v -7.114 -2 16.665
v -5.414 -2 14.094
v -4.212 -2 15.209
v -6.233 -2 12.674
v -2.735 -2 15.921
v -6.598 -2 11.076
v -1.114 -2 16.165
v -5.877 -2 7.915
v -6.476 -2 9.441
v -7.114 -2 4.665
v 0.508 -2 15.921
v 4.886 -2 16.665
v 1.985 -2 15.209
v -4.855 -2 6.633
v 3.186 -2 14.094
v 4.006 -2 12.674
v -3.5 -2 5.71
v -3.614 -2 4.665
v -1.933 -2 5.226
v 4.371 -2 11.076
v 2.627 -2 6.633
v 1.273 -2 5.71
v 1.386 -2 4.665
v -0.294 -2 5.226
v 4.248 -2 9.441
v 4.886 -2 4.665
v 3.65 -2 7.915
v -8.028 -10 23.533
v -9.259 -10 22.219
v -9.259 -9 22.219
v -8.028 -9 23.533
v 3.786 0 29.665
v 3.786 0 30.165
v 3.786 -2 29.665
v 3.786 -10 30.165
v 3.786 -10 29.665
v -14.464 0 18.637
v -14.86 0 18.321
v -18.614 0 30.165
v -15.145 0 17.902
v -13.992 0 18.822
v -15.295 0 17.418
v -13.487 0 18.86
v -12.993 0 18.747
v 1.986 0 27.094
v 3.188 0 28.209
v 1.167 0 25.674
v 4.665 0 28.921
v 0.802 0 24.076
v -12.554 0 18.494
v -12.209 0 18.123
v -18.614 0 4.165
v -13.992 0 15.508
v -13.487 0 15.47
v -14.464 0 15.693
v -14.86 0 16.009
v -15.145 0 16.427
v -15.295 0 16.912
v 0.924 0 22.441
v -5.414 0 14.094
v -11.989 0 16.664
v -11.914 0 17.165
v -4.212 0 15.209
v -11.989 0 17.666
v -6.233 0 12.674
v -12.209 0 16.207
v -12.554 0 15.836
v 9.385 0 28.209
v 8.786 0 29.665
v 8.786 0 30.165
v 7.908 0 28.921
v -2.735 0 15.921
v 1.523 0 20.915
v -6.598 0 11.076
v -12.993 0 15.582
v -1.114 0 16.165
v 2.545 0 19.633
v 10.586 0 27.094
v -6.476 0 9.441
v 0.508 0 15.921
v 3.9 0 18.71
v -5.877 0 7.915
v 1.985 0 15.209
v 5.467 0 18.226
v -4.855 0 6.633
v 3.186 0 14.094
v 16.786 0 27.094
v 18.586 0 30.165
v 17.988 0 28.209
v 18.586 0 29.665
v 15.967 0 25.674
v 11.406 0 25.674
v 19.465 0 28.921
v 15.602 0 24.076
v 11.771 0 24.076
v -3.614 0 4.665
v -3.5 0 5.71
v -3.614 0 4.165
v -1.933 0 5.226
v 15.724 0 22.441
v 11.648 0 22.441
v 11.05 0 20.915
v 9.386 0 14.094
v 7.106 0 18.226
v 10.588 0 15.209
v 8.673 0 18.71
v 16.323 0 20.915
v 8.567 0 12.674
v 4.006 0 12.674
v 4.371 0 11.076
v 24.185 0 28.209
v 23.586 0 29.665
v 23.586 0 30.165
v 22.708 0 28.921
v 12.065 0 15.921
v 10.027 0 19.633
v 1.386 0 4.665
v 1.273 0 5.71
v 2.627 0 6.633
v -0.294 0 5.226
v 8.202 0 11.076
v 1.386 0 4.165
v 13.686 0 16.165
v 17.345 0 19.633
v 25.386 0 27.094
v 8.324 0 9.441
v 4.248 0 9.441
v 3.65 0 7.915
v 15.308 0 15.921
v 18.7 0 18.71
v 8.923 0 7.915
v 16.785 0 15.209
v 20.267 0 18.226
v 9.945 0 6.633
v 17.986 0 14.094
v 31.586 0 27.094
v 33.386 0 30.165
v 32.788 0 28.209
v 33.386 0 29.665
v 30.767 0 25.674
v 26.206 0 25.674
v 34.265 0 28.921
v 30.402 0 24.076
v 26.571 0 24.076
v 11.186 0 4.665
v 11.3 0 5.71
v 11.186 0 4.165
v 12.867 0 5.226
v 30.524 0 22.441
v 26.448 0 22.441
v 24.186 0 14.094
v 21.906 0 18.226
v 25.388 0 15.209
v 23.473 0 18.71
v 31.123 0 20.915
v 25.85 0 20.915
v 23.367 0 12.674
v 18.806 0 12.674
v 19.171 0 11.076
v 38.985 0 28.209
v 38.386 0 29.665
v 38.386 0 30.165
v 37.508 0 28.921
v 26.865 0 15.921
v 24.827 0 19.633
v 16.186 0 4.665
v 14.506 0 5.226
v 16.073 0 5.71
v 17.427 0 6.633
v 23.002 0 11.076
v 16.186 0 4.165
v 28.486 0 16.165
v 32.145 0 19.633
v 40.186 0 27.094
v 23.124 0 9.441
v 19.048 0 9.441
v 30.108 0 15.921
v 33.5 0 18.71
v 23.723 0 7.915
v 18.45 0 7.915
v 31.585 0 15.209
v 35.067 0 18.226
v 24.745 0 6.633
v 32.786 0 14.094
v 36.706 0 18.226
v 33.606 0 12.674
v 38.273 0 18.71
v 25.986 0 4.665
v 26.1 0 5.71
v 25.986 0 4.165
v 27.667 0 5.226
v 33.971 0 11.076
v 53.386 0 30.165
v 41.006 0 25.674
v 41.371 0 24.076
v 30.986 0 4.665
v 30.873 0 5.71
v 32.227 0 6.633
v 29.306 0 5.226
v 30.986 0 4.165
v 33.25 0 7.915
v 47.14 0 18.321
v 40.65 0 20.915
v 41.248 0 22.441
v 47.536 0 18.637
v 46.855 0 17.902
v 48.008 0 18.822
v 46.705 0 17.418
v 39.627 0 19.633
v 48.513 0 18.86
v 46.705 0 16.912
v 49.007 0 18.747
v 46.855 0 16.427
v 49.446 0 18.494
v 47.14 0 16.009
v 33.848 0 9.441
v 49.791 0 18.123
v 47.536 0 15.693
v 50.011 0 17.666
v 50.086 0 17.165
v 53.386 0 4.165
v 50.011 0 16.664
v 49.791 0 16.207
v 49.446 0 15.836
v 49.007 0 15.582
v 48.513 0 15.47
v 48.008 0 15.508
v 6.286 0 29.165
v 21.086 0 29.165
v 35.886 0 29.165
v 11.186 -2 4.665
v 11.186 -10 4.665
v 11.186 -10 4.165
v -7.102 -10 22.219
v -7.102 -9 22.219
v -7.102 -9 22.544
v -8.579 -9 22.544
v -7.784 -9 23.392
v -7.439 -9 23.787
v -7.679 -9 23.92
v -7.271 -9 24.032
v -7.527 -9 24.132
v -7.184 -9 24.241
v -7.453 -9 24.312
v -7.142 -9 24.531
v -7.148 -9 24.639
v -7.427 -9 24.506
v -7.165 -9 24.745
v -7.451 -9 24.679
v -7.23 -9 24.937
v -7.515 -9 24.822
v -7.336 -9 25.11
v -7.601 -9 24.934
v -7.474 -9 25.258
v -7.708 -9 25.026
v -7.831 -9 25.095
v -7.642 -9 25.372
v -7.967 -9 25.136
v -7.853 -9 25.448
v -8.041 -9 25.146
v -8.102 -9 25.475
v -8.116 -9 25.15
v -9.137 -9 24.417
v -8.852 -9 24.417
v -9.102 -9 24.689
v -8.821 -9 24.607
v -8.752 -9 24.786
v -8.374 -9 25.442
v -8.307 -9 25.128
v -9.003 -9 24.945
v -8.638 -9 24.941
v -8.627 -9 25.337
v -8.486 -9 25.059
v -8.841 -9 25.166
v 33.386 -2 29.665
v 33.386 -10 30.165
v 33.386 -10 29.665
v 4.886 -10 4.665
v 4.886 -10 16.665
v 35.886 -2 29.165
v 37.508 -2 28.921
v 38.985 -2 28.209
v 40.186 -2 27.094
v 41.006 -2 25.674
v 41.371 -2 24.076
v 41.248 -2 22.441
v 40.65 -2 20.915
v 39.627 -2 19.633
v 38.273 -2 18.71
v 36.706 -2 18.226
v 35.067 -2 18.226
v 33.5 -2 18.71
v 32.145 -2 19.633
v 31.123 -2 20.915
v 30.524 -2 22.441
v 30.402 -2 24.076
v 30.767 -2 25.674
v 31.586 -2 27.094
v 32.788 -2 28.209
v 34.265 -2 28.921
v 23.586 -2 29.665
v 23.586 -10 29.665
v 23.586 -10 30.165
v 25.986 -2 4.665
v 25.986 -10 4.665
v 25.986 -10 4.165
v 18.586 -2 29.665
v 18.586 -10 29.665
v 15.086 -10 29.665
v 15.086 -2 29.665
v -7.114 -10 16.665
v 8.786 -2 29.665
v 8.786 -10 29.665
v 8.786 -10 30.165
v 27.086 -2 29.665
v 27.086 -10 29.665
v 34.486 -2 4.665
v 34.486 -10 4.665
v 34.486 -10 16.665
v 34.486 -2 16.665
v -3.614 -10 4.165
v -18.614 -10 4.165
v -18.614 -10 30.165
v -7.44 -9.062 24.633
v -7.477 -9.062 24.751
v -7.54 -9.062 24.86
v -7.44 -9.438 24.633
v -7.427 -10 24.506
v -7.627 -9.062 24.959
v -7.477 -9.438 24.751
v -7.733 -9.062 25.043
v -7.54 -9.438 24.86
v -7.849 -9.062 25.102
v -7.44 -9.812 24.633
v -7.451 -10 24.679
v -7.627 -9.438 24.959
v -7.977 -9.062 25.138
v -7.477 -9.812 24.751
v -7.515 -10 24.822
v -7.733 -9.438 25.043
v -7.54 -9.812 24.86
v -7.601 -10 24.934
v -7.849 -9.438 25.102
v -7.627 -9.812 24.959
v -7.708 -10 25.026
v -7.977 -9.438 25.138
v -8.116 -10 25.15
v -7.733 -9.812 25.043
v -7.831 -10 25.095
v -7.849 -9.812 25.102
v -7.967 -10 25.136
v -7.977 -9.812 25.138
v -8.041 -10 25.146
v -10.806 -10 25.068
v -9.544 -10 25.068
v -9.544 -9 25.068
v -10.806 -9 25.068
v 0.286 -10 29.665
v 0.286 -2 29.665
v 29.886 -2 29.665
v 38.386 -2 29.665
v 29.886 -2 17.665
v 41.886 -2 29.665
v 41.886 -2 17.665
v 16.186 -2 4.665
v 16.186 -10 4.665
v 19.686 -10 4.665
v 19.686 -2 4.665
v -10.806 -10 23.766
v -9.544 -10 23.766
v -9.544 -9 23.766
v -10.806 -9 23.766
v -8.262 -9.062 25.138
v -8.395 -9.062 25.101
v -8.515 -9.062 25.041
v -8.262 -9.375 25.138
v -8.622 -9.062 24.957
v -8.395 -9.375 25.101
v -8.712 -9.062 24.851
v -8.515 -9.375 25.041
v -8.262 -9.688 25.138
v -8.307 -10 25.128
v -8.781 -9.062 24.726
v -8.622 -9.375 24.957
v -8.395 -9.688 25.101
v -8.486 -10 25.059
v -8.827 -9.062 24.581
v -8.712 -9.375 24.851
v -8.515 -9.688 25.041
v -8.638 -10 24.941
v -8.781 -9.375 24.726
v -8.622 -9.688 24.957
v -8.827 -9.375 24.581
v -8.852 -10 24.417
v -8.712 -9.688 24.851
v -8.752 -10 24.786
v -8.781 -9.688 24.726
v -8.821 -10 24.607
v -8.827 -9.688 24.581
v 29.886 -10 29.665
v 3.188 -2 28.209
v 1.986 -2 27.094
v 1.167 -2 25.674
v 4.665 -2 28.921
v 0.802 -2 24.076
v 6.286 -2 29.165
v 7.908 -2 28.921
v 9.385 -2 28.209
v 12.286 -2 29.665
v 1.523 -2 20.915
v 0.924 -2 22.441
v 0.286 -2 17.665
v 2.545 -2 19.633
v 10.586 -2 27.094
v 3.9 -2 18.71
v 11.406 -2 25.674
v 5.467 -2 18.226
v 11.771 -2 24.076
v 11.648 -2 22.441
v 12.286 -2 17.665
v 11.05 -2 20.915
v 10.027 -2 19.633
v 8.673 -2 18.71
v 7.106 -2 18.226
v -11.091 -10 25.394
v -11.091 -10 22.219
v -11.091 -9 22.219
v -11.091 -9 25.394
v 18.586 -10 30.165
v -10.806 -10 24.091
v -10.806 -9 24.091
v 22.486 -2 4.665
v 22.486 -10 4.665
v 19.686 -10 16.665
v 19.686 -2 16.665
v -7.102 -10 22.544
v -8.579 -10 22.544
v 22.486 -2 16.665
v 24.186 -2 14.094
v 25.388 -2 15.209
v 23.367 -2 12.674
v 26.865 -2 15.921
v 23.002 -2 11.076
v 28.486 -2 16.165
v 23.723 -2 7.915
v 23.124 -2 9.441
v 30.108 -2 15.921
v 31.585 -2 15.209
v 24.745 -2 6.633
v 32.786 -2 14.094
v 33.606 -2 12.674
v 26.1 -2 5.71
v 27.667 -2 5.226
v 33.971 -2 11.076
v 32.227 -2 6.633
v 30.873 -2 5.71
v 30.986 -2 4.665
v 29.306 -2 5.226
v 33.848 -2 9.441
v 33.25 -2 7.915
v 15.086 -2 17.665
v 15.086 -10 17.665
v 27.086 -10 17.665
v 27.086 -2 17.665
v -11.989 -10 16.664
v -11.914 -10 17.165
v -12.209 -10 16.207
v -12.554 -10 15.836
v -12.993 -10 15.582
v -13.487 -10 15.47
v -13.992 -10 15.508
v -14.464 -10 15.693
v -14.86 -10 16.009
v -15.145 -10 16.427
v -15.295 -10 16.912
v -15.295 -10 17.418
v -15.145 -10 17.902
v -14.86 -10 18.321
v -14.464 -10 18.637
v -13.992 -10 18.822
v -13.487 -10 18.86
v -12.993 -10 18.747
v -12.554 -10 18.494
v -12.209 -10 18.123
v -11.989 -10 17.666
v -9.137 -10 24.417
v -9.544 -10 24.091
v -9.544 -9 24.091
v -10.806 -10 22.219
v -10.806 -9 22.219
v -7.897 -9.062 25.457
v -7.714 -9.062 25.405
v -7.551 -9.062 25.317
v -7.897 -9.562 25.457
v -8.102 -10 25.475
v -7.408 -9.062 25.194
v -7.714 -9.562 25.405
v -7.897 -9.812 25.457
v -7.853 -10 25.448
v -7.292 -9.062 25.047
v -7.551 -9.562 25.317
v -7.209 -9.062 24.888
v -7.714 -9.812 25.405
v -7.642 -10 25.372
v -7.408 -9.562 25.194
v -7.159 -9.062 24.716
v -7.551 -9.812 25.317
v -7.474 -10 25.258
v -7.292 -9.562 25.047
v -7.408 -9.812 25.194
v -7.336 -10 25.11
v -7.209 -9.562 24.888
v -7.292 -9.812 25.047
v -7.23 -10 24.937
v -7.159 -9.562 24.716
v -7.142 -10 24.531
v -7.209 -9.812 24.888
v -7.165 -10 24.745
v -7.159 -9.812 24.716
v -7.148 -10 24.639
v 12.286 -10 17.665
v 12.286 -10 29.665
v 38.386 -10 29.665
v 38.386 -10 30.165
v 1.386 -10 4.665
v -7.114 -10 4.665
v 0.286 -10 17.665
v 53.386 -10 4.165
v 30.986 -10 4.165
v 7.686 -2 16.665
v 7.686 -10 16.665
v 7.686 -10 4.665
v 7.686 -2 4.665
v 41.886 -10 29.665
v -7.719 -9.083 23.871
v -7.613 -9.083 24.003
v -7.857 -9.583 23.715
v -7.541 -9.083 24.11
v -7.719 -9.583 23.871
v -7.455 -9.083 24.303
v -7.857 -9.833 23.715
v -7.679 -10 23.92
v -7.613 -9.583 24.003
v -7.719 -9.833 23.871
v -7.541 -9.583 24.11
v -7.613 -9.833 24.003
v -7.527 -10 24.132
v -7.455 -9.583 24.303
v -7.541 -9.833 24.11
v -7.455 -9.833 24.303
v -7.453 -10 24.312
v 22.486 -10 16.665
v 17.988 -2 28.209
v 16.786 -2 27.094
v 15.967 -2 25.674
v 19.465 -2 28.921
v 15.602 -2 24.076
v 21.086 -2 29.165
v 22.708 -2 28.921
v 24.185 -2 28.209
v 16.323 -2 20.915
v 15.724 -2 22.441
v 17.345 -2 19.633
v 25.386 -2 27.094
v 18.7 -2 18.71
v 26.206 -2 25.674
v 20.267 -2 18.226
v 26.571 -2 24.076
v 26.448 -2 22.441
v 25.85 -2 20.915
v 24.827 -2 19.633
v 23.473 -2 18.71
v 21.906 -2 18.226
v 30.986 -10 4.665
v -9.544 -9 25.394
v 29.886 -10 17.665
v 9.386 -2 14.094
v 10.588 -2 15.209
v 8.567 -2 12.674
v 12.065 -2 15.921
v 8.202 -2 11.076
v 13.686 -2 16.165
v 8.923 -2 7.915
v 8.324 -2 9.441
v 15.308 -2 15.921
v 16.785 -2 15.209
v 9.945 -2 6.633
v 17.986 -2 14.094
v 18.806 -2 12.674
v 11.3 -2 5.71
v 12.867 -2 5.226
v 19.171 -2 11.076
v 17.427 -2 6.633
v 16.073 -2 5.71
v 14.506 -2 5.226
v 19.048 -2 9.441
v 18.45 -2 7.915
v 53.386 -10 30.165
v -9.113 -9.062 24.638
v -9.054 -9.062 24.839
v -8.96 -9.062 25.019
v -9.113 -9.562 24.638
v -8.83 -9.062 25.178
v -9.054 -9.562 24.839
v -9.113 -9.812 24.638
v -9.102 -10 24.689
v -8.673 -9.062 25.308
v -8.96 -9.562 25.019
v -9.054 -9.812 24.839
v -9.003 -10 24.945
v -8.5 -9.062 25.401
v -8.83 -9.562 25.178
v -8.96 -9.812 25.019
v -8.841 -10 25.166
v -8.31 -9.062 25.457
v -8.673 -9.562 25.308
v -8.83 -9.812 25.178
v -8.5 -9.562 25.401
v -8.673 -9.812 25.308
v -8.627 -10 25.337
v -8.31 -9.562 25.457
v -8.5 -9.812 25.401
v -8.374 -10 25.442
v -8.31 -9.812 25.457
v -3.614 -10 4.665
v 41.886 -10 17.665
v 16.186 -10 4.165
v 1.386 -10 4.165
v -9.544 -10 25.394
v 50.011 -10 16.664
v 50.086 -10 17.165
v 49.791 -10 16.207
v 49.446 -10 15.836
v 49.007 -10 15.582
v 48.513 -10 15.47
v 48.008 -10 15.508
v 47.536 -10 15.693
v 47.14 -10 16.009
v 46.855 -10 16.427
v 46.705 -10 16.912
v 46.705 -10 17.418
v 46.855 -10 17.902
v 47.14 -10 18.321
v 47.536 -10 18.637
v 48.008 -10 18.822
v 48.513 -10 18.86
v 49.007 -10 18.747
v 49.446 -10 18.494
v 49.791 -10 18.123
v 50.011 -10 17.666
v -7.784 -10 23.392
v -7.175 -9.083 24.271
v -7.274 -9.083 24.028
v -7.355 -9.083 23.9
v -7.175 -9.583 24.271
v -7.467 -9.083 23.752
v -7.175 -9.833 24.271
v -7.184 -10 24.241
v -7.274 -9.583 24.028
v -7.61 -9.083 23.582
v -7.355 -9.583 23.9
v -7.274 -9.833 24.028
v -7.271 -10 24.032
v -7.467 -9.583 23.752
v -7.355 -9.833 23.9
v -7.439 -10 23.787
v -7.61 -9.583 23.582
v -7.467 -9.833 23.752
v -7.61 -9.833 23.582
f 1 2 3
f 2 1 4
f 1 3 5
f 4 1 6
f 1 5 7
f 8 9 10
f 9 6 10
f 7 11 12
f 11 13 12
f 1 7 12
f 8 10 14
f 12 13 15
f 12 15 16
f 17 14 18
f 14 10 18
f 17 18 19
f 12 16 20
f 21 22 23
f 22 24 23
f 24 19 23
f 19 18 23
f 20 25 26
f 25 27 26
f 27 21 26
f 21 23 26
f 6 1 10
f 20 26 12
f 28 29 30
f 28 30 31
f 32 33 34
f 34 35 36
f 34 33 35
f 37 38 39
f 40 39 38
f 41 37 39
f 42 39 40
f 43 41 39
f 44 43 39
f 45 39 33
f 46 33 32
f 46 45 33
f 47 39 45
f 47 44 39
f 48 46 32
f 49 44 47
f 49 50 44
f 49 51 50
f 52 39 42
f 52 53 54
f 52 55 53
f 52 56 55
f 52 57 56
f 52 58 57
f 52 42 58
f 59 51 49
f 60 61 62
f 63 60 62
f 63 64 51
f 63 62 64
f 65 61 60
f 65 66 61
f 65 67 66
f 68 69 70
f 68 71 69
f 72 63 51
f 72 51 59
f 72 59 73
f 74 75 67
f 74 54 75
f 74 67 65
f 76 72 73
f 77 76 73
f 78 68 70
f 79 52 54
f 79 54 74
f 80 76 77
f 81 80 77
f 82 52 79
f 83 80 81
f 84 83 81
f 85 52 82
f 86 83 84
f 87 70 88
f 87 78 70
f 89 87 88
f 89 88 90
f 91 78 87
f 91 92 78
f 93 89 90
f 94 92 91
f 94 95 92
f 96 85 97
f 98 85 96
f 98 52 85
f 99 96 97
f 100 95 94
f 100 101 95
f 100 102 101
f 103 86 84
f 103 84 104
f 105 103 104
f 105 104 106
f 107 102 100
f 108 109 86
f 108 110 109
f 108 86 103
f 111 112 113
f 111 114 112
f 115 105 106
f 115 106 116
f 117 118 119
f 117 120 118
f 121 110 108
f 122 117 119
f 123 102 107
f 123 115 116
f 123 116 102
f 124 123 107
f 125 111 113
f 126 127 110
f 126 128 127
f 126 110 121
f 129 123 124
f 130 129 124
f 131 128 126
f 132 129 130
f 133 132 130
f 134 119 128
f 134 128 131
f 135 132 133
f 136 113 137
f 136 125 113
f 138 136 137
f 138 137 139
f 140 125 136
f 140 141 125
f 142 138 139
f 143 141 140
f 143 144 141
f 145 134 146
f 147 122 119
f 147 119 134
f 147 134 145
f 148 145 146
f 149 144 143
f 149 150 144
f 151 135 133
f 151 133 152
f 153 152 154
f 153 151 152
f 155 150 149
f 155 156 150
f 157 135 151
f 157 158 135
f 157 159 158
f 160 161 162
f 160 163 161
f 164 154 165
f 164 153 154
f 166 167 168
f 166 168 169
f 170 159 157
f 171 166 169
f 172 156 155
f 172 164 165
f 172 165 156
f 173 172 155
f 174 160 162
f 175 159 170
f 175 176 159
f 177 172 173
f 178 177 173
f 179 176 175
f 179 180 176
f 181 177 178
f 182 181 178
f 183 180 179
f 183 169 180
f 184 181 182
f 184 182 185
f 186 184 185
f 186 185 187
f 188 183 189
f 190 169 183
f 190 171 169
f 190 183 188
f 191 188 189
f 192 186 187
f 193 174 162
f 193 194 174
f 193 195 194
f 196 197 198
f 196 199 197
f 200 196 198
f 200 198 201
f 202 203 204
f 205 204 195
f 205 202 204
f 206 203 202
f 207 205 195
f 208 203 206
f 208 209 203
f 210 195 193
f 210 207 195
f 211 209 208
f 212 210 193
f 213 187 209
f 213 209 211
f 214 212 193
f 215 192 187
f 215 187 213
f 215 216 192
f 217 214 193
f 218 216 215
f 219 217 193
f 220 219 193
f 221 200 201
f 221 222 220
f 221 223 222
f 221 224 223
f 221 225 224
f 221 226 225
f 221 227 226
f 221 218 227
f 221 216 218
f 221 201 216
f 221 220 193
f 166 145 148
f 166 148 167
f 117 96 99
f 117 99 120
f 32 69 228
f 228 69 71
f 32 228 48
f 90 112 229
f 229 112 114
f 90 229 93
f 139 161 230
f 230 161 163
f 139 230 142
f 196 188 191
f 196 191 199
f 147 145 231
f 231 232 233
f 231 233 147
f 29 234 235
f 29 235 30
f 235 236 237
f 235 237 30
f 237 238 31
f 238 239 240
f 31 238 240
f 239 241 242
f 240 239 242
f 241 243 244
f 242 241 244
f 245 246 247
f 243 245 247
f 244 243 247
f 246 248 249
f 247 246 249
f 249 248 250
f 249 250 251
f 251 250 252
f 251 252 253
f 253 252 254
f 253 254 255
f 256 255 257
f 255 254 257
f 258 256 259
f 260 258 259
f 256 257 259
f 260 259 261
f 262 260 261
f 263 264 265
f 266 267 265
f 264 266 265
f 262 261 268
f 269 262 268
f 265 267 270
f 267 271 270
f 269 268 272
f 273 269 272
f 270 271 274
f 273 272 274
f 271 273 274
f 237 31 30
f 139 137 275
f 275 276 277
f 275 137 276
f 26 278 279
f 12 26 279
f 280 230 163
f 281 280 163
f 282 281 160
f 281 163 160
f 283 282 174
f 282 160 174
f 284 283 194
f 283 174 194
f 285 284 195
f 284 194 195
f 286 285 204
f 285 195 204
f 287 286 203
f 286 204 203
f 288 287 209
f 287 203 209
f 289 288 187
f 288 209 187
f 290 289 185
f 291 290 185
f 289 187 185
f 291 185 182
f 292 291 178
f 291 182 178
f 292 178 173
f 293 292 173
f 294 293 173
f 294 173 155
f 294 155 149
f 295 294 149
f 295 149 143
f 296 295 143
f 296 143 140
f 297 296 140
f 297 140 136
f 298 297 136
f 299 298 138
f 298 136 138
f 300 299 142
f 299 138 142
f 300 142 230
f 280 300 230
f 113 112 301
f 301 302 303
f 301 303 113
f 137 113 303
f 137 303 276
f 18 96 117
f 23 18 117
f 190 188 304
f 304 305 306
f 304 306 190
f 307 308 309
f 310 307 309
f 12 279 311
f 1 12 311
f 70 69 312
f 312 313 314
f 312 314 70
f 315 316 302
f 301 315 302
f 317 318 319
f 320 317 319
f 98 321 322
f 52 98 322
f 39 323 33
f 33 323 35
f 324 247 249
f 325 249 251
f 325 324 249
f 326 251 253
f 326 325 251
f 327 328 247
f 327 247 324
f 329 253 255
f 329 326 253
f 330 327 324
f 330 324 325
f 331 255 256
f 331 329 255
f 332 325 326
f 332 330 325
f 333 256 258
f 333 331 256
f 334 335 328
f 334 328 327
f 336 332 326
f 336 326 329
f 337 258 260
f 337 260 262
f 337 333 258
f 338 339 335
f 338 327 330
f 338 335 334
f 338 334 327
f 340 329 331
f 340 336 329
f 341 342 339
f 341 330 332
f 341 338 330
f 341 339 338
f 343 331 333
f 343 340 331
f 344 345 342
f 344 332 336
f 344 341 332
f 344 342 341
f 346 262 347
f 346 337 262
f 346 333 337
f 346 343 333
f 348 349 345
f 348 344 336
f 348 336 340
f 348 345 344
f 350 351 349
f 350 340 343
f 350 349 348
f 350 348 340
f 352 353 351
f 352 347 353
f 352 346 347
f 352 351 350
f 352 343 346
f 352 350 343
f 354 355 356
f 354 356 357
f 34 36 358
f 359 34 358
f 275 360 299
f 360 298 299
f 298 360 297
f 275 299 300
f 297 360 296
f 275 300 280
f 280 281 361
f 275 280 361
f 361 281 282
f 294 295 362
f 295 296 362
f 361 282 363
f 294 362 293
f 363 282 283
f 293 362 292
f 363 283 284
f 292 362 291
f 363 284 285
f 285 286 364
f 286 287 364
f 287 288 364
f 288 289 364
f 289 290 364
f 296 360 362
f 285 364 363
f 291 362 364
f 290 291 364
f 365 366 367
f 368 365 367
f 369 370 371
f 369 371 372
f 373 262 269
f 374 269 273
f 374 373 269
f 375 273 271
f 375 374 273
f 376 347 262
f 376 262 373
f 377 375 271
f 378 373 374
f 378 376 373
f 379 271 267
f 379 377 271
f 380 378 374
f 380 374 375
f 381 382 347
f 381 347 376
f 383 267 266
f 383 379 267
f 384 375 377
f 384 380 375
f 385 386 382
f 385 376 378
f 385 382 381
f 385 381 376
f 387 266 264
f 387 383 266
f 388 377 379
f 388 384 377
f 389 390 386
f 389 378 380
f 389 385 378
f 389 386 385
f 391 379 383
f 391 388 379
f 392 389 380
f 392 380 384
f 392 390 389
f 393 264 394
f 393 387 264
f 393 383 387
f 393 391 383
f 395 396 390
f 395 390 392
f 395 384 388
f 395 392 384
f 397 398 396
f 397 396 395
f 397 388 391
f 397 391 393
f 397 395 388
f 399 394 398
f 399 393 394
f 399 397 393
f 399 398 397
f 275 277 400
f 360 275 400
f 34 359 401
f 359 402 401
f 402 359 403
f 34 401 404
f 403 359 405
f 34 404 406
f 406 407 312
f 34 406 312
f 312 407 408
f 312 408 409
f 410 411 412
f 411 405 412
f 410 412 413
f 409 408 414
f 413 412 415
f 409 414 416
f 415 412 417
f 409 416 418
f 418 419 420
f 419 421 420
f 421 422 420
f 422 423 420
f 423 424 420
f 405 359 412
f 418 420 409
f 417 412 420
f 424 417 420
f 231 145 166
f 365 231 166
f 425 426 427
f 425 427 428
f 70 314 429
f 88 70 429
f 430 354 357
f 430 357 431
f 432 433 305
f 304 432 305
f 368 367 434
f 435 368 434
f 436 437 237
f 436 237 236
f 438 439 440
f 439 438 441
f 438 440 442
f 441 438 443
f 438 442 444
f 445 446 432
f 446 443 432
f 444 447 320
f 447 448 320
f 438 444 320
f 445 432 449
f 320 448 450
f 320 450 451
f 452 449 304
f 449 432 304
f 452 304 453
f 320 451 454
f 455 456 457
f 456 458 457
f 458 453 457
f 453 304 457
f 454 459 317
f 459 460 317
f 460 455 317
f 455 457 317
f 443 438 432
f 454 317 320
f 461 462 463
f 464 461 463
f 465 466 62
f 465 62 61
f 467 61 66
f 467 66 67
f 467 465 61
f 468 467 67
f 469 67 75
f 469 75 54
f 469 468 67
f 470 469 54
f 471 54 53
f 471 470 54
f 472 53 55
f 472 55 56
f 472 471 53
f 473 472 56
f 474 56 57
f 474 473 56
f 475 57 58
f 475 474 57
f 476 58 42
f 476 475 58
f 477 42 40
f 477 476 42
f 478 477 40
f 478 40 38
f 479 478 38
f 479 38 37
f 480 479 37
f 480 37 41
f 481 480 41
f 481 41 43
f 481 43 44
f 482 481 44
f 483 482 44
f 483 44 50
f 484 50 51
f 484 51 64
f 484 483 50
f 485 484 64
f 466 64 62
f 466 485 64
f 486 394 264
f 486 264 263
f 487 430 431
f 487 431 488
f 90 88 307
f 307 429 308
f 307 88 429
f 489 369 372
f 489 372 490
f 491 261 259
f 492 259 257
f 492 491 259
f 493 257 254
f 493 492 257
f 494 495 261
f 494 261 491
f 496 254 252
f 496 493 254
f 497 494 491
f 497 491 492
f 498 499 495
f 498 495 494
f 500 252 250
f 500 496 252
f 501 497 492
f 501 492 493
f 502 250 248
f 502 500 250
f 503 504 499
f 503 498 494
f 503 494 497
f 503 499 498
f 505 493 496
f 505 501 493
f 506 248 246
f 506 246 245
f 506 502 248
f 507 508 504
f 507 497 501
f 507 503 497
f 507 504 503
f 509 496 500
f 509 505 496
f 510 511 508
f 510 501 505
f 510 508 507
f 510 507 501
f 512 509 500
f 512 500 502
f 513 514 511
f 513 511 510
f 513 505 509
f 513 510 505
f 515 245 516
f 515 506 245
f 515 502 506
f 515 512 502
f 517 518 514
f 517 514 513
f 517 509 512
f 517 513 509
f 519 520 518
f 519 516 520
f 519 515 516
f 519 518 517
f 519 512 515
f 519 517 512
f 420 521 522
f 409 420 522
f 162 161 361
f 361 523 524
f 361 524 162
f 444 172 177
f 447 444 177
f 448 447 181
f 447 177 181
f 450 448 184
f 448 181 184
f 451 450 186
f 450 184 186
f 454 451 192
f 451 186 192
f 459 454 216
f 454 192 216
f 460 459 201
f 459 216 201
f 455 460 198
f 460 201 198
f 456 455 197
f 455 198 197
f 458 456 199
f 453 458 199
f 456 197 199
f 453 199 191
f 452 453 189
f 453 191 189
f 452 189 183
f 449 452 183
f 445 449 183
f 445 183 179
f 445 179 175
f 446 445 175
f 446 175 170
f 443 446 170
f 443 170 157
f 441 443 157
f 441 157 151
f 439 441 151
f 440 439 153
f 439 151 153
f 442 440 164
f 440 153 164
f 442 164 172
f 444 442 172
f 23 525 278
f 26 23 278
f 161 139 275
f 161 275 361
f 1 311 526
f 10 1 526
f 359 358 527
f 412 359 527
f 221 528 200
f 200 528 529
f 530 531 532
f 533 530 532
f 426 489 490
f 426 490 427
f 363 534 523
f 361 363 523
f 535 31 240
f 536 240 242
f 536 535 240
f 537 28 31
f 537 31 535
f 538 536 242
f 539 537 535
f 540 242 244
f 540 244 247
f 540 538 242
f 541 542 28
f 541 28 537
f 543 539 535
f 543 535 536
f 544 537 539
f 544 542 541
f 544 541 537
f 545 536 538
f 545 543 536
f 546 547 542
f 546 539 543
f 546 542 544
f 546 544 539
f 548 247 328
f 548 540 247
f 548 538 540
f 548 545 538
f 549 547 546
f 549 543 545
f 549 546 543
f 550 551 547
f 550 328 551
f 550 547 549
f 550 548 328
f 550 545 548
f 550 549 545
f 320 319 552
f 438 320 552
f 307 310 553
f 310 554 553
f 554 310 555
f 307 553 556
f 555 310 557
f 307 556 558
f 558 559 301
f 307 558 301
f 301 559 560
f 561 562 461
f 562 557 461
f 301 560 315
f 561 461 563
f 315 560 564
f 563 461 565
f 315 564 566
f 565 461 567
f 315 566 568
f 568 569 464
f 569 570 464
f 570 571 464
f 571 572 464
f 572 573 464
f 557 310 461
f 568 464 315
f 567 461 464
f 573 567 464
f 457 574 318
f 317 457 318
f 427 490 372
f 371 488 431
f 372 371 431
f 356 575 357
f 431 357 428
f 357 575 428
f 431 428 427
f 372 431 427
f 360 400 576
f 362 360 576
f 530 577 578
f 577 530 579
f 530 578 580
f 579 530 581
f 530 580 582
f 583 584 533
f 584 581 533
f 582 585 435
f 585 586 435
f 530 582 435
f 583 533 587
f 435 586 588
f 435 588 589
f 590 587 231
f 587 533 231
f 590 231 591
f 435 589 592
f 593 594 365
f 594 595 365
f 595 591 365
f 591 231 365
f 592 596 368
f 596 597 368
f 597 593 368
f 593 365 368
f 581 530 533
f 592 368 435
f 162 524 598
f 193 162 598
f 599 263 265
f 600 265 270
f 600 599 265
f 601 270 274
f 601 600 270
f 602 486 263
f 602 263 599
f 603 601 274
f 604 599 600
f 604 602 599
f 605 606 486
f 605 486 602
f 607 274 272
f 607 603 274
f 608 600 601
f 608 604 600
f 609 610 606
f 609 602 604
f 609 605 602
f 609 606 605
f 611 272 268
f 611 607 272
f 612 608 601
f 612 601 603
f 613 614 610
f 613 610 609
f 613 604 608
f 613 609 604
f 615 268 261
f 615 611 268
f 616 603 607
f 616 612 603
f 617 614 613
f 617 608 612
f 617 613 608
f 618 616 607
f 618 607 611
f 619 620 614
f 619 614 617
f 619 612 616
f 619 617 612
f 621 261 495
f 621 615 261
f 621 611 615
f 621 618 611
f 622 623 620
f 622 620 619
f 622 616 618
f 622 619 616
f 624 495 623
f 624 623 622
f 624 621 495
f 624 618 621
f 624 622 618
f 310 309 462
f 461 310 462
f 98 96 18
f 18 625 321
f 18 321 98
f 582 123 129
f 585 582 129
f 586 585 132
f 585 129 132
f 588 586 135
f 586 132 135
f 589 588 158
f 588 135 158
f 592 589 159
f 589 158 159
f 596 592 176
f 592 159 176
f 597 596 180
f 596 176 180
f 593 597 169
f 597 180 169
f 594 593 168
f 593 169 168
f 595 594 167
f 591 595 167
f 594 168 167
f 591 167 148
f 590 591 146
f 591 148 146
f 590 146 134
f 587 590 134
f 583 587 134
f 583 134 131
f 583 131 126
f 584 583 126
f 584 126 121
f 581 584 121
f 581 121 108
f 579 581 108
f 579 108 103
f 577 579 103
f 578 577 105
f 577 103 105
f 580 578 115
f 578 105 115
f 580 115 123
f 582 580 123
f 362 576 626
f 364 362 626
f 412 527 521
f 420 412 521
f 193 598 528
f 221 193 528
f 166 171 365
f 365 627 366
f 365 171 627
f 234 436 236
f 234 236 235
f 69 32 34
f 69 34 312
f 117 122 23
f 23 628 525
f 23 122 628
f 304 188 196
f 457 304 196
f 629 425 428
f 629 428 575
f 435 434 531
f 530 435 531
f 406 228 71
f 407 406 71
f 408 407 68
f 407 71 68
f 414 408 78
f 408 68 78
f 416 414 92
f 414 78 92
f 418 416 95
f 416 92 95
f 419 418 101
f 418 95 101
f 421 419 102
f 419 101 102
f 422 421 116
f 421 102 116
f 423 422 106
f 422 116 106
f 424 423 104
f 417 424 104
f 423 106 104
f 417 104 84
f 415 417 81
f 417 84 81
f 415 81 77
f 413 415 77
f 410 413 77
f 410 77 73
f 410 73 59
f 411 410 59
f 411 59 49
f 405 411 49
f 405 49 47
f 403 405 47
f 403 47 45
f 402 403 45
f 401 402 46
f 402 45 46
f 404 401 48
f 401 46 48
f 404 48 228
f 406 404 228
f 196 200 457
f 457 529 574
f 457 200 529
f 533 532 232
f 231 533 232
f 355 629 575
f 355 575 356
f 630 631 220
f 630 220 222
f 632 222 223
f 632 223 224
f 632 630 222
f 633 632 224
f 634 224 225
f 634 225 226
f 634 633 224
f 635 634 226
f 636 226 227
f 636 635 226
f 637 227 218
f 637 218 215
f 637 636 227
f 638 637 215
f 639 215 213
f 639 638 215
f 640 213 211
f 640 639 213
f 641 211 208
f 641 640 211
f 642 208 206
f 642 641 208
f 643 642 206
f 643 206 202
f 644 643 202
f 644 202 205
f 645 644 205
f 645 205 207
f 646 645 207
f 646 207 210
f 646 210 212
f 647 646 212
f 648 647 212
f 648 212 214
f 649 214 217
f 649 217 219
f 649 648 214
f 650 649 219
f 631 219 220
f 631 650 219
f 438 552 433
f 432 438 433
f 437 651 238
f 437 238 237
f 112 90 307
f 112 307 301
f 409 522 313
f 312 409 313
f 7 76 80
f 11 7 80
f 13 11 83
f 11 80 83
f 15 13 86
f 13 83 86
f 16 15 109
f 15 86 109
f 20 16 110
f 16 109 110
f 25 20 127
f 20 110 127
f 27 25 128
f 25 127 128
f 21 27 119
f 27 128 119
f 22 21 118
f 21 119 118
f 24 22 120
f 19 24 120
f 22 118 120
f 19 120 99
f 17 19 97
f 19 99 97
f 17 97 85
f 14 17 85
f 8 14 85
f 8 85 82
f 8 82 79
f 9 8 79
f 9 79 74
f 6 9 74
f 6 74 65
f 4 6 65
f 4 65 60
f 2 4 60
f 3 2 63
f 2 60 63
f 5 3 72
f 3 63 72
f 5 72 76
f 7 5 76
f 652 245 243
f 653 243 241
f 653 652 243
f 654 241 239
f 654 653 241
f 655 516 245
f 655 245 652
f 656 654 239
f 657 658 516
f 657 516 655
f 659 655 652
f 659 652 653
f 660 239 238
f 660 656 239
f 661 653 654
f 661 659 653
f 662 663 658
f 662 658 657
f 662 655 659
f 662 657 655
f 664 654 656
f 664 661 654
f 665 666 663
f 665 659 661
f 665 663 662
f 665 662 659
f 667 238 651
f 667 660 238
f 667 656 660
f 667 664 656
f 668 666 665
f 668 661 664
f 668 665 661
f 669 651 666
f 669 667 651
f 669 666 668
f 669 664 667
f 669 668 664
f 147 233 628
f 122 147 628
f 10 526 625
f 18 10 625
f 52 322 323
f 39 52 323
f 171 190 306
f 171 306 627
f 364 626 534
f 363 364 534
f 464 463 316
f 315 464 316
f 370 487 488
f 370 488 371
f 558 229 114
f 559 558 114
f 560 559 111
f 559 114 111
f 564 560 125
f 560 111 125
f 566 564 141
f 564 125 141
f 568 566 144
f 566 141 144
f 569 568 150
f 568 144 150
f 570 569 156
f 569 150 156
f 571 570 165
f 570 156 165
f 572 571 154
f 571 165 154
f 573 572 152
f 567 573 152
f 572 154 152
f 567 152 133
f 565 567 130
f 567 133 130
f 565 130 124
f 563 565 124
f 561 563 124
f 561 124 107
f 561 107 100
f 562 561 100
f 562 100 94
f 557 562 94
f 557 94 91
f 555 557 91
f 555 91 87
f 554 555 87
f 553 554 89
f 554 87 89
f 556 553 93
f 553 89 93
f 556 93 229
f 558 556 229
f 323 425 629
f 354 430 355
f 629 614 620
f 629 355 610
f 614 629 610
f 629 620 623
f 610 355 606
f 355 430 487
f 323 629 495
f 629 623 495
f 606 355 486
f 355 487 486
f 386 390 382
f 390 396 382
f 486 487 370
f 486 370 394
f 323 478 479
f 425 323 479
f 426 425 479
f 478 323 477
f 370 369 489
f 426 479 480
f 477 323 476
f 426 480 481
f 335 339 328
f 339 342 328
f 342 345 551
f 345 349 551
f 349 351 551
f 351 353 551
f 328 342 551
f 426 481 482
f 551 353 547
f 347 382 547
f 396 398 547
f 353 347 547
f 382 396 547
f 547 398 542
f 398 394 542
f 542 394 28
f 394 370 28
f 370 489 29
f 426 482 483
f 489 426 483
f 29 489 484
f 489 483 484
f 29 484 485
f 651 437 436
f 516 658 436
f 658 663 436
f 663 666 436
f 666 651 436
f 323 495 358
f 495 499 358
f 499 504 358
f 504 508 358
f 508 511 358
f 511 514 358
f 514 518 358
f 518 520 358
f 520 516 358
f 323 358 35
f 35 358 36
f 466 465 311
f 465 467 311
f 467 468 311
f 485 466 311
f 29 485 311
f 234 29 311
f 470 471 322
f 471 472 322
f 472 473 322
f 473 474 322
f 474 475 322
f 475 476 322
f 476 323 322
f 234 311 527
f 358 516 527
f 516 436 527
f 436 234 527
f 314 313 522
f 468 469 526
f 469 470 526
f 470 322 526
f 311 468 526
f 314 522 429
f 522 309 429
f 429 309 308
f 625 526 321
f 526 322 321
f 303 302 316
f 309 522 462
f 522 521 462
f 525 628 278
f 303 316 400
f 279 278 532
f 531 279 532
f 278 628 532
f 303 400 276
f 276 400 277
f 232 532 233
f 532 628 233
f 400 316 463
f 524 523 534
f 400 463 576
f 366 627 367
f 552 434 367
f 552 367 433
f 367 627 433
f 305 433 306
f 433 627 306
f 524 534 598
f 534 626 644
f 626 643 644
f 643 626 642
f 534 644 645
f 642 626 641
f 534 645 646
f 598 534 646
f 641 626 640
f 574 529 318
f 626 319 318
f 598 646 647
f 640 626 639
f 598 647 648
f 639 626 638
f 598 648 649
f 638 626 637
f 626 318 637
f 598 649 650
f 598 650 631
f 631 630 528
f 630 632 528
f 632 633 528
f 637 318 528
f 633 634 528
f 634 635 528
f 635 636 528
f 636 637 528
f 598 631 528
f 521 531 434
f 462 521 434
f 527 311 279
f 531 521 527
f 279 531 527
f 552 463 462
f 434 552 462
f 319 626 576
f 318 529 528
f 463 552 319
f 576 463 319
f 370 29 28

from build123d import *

# Parameters (mm, degrees)
SKETCH1_W               = 12
SKETCH1_H               = 12
SKETCH1_R               = 5.5
BOSS_EXTRUDE1_DEPTH     = 2
BOSS_EXTRUDE1_2_DEPTH   = 2
BOSS_EXTRUDE1_3_DEPTH   = 2
BOSS_EXTRUDE1_4_DEPTH   = 2
BOSS_EXTRUDE1_5_DEPTH   = 2
BOSS_EXTRUDE1_6_DEPTH   = 2
BOSS_EXTRUDE2_START     = -10
BOSS_EXTRUDE2_OUTLINE_R = 1.7
BOSS_EXTRUDE2_DEPTH     = 10
CUT_EXTRUDE1_DEPTH      = 1


# Read off the part's stored shape, not the designer's step: Boss-Extrude2
with BuildPart() as part:
    # Sketch1 → Boss-Extrude1 (new body)
    with BuildSketch(Plane(origin=(0, 0, 0), x_dir=(1, 0, 0), z_dir=(0, 1, 0))):
        with Locations((13.686388819, -10.664882883)):
            Rectangle(SKETCH1_W, SKETCH1_H)
        with Locations(Location((13.686388819, -10.664882883, 0), (0, 0, 270))):
            Circle(SKETCH1_R, mode=Mode.SUBTRACT)
    extrude(amount=-BOSS_EXTRUDE1_DEPTH)



with BuildPart() as body_2:
    # Sketch1 → Boss-Extrude1 2 (new body)
    with BuildSketch(Plane(origin=(0, 0, 0), x_dir=(1, 0, 0), z_dir=(0, 1, 0))):
        with Locations((-1.113611181, -10.664882883)):
            Rectangle(SKETCH1_W, SKETCH1_H)
        with Locations(Location((-1.113611181, -10.664882883, 0), (0, 0, 270))):
            Circle(SKETCH1_R, mode=Mode.SUBTRACT)
    extrude(amount=-BOSS_EXTRUDE1_2_DEPTH)


with BuildPart() as body_3:
    # Sketch1 → Boss-Extrude1 3 (new body)
    with BuildSketch(Plane(origin=(0, 0, 0), x_dir=(1, 0, 0), z_dir=(0, 1, 0))):
        with Locations((6.28638882, -23.664882883)):
            Rectangle(SKETCH1_W, SKETCH1_H)
        with Locations(Location((6.28638882, -23.664882883, 0), (0, 0, 270))):
            Circle(SKETCH1_R, mode=Mode.SUBTRACT)
    extrude(amount=-BOSS_EXTRUDE1_3_DEPTH)


with BuildPart() as body_4:
    # Sketch1 → Boss-Extrude1 4 (new body)
    with BuildSketch(Plane(origin=(0, 0, 0), x_dir=(1, 0, 0), z_dir=(0, 1, 0))):
        with Locations((21.08638882, -23.664882883)):
            Rectangle(SKETCH1_W, SKETCH1_H)
        with Locations(Location((21.08638882, -23.664882883, 0), (0, 0, 270))):
            Circle(SKETCH1_R, mode=Mode.SUBTRACT)
    extrude(amount=-BOSS_EXTRUDE1_4_DEPTH)


with BuildPart() as body_5:
    # Sketch1 → Boss-Extrude1 5 (new body)
    with BuildSketch(Plane(origin=(0, 0, 0), x_dir=(1, 0, 0), z_dir=(0, 1, 0))):
        with Locations((35.88638882, -23.664882883)):
            Rectangle(SKETCH1_W, SKETCH1_H)
        with Locations(Location((35.88638882, -23.664882883, 0), (0, 0, 270))):
            Circle(SKETCH1_R, mode=Mode.SUBTRACT)
    extrude(amount=-BOSS_EXTRUDE1_5_DEPTH)


with BuildPart() as body_6:
    # Sketch1 → Boss-Extrude1 6 (new body)
    with BuildSketch(Plane(origin=(0, 0, 0), x_dir=(1, 0, 0), z_dir=(0, 1, 0))):
        with Locations((28.486388819, -10.664882883)):
            Rectangle(SKETCH1_W, SKETCH1_H)
        with Locations(Location((28.486388819, -10.664882883, 0), (0, 0, 270))):
            Circle(SKETCH1_R, mode=Mode.SUBTRACT)
    extrude(amount=-BOSS_EXTRUDE1_6_DEPTH)


with BuildPart() as part_1:
    add(part.part)

    add(body_2.part)  # Boss-Extrude2 merges body 2

    add(body_3.part)  # Boss-Extrude2 merges body 3

    add(body_4.part)  # Boss-Extrude2 merges body 4

    add(body_5.part)  # Boss-Extrude2 merges body 5

    add(body_6.part)  # Boss-Extrude2 merges body 6
    # Boss-Extrude2 outline → Boss-Extrude2 (add)
    with BuildSketch(Plane(origin=(0, 0, 0), x_dir=(1, 0, 0), z_dir=(0, 1, 0)).offset(BOSS_EXTRUDE2_START)):
        Polygon((22.486388819, -4.664882883), (25.986388819, -4.664882883), (25.986388819, -4.164882883), (16.186388819, -4.164882883), (16.186388819, -4.664882883), (19.686388819, -4.664882883), (19.686388819, -16.664882883), (7.686388819, -16.664882883), (7.686388819, -4.664882883), (11.186388819, -4.664882883), (11.186388819, -4.164882883), (1.386388819, -4.164882883), (1.386388819, -4.664882883), (4.886388819, -4.664882883), (4.886388819, -16.664882883), (-7.113611181, -16.664882883), (-7.113611181, -4.664882883), (-3.613611181, -4.664882883), (-3.613611181, -4.164882883), (-18.613611181, -4.164883527), (-18.613611181, -30.164882449), (3.78638882, -30.164882883), (3.78638882, -29.664882883), (0.28638882, -29.664882883), (0.28638882, -17.664882883), (12.28638882, -17.664882883), (12.28638882, -29.664882883), (8.78638882, -29.664882883), (8.78638882, -30.164882883), (18.58638882, -30.164882883), (18.58638882, -29.664882883), (15.08638882, -29.664882883), (15.08638882, -17.664882883), (27.08638882, -17.664882883), (27.08638882, -29.664882883), (23.58638882, -29.664882883), (23.58638882, -30.164882883), (33.38638882, -30.164882883), (33.38638882, -29.664882883), (29.88638882, -29.664882883), (29.88638882, -17.664882883), (41.88638882, -17.664882883), (41.88638882, -29.664882883), (38.38638882, -29.664882883), (38.38638882, -30.164882883), (53.38638882, -30.164882883), (53.38638882, -4.164882883), (30.986388819, -4.164882883), (30.986388819, -4.664882883), (34.486388819, -4.664882883), (34.486388819, -16.664882883), (22.486388819, -16.664882883), align=None)
        with Locations((-13.613611181, -17.164882988)):
            Circle(BOSS_EXTRUDE2_OUTLINE_R, mode=Mode.SUBTRACT)
        with Locations((48.386388819, -17.164882988)):
            Circle(BOSS_EXTRUDE2_OUTLINE_R, mode=Mode.SUBTRACT)
    extrude(amount=BOSS_EXTRUDE2_DEPTH)

    # Sketch2 → Cut-Extrude1 (cut)
    with BuildSketch(Plane.XZ.offset(10)):
        Polygon((-11.090813446, 25.393846705), (-9.544018575, 25.393846705), (-9.544018575, 25.068205679), (-10.805877549, 25.068205679), (-10.805877549, 24.091282602), (-9.544018575, 24.091282602), (-9.544018575, 23.765641577), (-10.805877549, 23.765641577), (-10.805877549, 22.218846705), (-11.090813446, 22.218846705), align=None)
        with BuildLine():
            Line((-8.852031395, 24.416923628), (-9.136967293, 24.416923628))
            add(Edge.make_bspline(
                [(-9.136967293, 24.416923628), (-9.135110232, 24.454725076), (-9.131463015, 24.528966114), (-9.114383067, 24.637209944), (-9.089943843, 24.74067394), (-9.055389453, 24.838527362), (-9.012475901, 24.931635423), (-8.961013662, 25.019628294), (-8.90005924, 25.102170301), (-8.830928846, 25.178496252), (-8.755845866, 25.248516405), (-8.674832621, 25.308982233), (-8.589701775, 25.360070406), (-8.500711605, 25.402779818), (-8.406858094, 25.434838107), (-8.30899293, 25.45862488), (-8.206686142, 25.472936279), (-8.136981265, 25.474474599), (-8.101530594, 25.475256961)],
                knots=[0, 0, 0, 0, 1.10065271, 2.161652631, 3.183658789, 4.190468796, 5.17591951, 6.163126047, 7.15150782, 8.156236427, 9.156009102, 10.134482811, 11.092018607, 12.041330605, 13.001268258, 13.972401359, 14.968799086, 16, 16, 16, 16], degree=3))
            add(Edge.make_bspline(
                [(-8.101530594, 25.475256961), (-8.066716198, 25.474441933), (-7.998307154, 25.472840431), (-7.898465184, 25.459087212), (-7.803417209, 25.437546568), (-7.713349021, 25.407324726), (-7.628979234, 25.366698853), (-7.549674044, 25.3178968), (-7.474489308, 25.261454524), (-7.406810297, 25.195002851), (-7.344663683, 25.124062116), (-7.291049494, 25.048326661), (-7.245136124, 24.97010438), (-7.206865872, 24.888798797), (-7.178693517, 24.803644364), (-7.157304714, 24.71588083), (-7.145214846, 24.624599752), (-7.143359355, 24.562817376), (-7.142416011, 24.531406801)],
                knots=[0, 0, 0, 0, 1.111607364, 2.184268762, 3.212621178, 4.221274766, 5.211760367, 6.196651075, 7.1921475, 8.207485113, 9.220403448, 10.201281604, 11.166441695, 12.114753415, 13.065576456, 14.026450734, 14.996634279, 16, 16, 16, 16], degree=3))
            add(Edge.make_bspline(
                [(-7.142416011, 24.531406801), (-7.143946038, 24.48718376), (-7.146979244, 24.399513729), (-7.173155489, 24.270514062), (-7.21359782, 24.145414473), (-7.262649782, 24.044740618), (-7.31219844, 23.964025865), (-7.355904397, 23.896973819), (-7.408203317, 23.825466998), (-7.468616685, 23.748785207), (-7.536233124, 23.666693885), (-7.611539287, 23.579159348), (-7.695110449, 23.487111285), (-7.753764656, 23.424241012), (-7.784157797, 23.391663211)],
                knots=[0, 0, 0, 0, 1.184203166, 2.347625244, 3.513805382, 4.700623107, 5.337941753, 6.051866363, 6.845199593, 7.711357327, 8.668078039, 9.695487809, 10.805859518, 12, 12, 12, 12], degree=3))
            Line((-7.784157797, 23.391663211), (-8.578543815, 22.544487731))
            Line((-8.578543815, 22.544487731), (-7.101710882, 22.544487731))
            Line((-7.101710882, 22.544487731), (-7.101710882, 22.218846705))
            Line((-7.101710882, 22.218846705), (-9.259082677, 22.218846705))
            Line((-9.259082677, 22.218846705), (-8.027752549, 23.532859125))
            add(Edge.make_bspline(
                [(-8.027752549, 23.532859125), (-7.997773395, 23.564154017), (-7.940189574, 23.624265101), (-7.858743951, 23.712024786), (-7.785592869, 23.793440441), (-7.720262805, 23.868358238), (-7.664170983, 23.937874018), (-7.614394029, 23.999736356), (-7.574510957, 24.056663607), (-7.531226277, 24.122649736), (-7.489303594, 24.203215195), (-7.453278814, 24.301670756), (-7.431312487, 24.403023335), (-7.428677386, 24.471514469), (-7.427351908, 24.505966096)],
                knots=[0, 0, 0, 0, 1.329631726, 2.553950428, 3.673215718, 4.687767853, 5.603093632, 6.413772471, 7.123043292, 7.734684054, 8.834405432, 9.900288307, 10.943827018, 12, 12, 12, 12], degree=3))
            add(Edge.make_bspline(
                [(-7.427351908, 24.505966096), (-7.427928617, 24.527629936), (-7.4290652, 24.570325205), (-7.439096111, 24.632923286), (-7.454254927, 24.693307081), (-7.475976697, 24.751662329), (-7.504648526, 24.807402313), (-7.539549378, 24.860594884), (-7.579817506, 24.912019874), (-7.626400444, 24.960237509), (-7.677573751, 25.004398317), (-7.731634249, 25.043518023), (-7.7888297, 25.076210645), (-7.848918954, 25.103010817), (-7.911734487, 25.124034199), (-7.977397792, 25.138601624), (-8.045727435, 25.147747878), (-8.092384963, 25.148985376), (-8.116158999, 25.149615936)],
                knots=[0, 0, 0, 0, 0.991446411, 1.95395049, 2.89581595, 3.838931463, 4.798493298, 5.75982156, 6.748411868, 7.785213223, 8.824556874, 9.840280684, 10.836137867, 11.835679398, 12.848801643, 13.863922112, 14.911575587, 16, 16, 16, 16], degree=3))
            add(Edge.make_bspline(
                [(-8.116158999, 25.149615936), (-8.140988255, 25.148967299), (-8.189748813, 25.147693485), (-8.26133965, 25.138782925), (-8.329634605, 25.123410627), (-8.394805474, 25.102386072), (-8.456962527, 25.07566296), (-8.515803481, 25.042378306), (-8.571196245, 25.002660423), (-8.623244948, 24.957629347), (-8.671200129, 24.907493737), (-8.713334081, 24.851604699), (-8.75014958, 24.790982687), (-8.782270813, 24.725791273), (-8.808356332, 24.655438916), (-8.828289118, 24.580175355), (-8.844061472, 24.500327387), (-8.84933063, 24.445186632), (-8.852031395, 24.416923628)],
                knots=[0, 0, 0, 0, 1.031018746, 2.02475058, 2.990194455, 3.934040569, 4.864654155, 5.795059489, 6.735614925, 7.690564532, 8.649604399, 9.611025574, 10.590972636, 11.591080095, 12.624614302, 13.701020113, 14.821632451, 16, 16, 16, 16], degree=3))
        make_face()
    extrude(amount=-CUT_EXTRUDE1_DEPTH, mode=Mode.SUBTRACT)


solid = part_1.part
